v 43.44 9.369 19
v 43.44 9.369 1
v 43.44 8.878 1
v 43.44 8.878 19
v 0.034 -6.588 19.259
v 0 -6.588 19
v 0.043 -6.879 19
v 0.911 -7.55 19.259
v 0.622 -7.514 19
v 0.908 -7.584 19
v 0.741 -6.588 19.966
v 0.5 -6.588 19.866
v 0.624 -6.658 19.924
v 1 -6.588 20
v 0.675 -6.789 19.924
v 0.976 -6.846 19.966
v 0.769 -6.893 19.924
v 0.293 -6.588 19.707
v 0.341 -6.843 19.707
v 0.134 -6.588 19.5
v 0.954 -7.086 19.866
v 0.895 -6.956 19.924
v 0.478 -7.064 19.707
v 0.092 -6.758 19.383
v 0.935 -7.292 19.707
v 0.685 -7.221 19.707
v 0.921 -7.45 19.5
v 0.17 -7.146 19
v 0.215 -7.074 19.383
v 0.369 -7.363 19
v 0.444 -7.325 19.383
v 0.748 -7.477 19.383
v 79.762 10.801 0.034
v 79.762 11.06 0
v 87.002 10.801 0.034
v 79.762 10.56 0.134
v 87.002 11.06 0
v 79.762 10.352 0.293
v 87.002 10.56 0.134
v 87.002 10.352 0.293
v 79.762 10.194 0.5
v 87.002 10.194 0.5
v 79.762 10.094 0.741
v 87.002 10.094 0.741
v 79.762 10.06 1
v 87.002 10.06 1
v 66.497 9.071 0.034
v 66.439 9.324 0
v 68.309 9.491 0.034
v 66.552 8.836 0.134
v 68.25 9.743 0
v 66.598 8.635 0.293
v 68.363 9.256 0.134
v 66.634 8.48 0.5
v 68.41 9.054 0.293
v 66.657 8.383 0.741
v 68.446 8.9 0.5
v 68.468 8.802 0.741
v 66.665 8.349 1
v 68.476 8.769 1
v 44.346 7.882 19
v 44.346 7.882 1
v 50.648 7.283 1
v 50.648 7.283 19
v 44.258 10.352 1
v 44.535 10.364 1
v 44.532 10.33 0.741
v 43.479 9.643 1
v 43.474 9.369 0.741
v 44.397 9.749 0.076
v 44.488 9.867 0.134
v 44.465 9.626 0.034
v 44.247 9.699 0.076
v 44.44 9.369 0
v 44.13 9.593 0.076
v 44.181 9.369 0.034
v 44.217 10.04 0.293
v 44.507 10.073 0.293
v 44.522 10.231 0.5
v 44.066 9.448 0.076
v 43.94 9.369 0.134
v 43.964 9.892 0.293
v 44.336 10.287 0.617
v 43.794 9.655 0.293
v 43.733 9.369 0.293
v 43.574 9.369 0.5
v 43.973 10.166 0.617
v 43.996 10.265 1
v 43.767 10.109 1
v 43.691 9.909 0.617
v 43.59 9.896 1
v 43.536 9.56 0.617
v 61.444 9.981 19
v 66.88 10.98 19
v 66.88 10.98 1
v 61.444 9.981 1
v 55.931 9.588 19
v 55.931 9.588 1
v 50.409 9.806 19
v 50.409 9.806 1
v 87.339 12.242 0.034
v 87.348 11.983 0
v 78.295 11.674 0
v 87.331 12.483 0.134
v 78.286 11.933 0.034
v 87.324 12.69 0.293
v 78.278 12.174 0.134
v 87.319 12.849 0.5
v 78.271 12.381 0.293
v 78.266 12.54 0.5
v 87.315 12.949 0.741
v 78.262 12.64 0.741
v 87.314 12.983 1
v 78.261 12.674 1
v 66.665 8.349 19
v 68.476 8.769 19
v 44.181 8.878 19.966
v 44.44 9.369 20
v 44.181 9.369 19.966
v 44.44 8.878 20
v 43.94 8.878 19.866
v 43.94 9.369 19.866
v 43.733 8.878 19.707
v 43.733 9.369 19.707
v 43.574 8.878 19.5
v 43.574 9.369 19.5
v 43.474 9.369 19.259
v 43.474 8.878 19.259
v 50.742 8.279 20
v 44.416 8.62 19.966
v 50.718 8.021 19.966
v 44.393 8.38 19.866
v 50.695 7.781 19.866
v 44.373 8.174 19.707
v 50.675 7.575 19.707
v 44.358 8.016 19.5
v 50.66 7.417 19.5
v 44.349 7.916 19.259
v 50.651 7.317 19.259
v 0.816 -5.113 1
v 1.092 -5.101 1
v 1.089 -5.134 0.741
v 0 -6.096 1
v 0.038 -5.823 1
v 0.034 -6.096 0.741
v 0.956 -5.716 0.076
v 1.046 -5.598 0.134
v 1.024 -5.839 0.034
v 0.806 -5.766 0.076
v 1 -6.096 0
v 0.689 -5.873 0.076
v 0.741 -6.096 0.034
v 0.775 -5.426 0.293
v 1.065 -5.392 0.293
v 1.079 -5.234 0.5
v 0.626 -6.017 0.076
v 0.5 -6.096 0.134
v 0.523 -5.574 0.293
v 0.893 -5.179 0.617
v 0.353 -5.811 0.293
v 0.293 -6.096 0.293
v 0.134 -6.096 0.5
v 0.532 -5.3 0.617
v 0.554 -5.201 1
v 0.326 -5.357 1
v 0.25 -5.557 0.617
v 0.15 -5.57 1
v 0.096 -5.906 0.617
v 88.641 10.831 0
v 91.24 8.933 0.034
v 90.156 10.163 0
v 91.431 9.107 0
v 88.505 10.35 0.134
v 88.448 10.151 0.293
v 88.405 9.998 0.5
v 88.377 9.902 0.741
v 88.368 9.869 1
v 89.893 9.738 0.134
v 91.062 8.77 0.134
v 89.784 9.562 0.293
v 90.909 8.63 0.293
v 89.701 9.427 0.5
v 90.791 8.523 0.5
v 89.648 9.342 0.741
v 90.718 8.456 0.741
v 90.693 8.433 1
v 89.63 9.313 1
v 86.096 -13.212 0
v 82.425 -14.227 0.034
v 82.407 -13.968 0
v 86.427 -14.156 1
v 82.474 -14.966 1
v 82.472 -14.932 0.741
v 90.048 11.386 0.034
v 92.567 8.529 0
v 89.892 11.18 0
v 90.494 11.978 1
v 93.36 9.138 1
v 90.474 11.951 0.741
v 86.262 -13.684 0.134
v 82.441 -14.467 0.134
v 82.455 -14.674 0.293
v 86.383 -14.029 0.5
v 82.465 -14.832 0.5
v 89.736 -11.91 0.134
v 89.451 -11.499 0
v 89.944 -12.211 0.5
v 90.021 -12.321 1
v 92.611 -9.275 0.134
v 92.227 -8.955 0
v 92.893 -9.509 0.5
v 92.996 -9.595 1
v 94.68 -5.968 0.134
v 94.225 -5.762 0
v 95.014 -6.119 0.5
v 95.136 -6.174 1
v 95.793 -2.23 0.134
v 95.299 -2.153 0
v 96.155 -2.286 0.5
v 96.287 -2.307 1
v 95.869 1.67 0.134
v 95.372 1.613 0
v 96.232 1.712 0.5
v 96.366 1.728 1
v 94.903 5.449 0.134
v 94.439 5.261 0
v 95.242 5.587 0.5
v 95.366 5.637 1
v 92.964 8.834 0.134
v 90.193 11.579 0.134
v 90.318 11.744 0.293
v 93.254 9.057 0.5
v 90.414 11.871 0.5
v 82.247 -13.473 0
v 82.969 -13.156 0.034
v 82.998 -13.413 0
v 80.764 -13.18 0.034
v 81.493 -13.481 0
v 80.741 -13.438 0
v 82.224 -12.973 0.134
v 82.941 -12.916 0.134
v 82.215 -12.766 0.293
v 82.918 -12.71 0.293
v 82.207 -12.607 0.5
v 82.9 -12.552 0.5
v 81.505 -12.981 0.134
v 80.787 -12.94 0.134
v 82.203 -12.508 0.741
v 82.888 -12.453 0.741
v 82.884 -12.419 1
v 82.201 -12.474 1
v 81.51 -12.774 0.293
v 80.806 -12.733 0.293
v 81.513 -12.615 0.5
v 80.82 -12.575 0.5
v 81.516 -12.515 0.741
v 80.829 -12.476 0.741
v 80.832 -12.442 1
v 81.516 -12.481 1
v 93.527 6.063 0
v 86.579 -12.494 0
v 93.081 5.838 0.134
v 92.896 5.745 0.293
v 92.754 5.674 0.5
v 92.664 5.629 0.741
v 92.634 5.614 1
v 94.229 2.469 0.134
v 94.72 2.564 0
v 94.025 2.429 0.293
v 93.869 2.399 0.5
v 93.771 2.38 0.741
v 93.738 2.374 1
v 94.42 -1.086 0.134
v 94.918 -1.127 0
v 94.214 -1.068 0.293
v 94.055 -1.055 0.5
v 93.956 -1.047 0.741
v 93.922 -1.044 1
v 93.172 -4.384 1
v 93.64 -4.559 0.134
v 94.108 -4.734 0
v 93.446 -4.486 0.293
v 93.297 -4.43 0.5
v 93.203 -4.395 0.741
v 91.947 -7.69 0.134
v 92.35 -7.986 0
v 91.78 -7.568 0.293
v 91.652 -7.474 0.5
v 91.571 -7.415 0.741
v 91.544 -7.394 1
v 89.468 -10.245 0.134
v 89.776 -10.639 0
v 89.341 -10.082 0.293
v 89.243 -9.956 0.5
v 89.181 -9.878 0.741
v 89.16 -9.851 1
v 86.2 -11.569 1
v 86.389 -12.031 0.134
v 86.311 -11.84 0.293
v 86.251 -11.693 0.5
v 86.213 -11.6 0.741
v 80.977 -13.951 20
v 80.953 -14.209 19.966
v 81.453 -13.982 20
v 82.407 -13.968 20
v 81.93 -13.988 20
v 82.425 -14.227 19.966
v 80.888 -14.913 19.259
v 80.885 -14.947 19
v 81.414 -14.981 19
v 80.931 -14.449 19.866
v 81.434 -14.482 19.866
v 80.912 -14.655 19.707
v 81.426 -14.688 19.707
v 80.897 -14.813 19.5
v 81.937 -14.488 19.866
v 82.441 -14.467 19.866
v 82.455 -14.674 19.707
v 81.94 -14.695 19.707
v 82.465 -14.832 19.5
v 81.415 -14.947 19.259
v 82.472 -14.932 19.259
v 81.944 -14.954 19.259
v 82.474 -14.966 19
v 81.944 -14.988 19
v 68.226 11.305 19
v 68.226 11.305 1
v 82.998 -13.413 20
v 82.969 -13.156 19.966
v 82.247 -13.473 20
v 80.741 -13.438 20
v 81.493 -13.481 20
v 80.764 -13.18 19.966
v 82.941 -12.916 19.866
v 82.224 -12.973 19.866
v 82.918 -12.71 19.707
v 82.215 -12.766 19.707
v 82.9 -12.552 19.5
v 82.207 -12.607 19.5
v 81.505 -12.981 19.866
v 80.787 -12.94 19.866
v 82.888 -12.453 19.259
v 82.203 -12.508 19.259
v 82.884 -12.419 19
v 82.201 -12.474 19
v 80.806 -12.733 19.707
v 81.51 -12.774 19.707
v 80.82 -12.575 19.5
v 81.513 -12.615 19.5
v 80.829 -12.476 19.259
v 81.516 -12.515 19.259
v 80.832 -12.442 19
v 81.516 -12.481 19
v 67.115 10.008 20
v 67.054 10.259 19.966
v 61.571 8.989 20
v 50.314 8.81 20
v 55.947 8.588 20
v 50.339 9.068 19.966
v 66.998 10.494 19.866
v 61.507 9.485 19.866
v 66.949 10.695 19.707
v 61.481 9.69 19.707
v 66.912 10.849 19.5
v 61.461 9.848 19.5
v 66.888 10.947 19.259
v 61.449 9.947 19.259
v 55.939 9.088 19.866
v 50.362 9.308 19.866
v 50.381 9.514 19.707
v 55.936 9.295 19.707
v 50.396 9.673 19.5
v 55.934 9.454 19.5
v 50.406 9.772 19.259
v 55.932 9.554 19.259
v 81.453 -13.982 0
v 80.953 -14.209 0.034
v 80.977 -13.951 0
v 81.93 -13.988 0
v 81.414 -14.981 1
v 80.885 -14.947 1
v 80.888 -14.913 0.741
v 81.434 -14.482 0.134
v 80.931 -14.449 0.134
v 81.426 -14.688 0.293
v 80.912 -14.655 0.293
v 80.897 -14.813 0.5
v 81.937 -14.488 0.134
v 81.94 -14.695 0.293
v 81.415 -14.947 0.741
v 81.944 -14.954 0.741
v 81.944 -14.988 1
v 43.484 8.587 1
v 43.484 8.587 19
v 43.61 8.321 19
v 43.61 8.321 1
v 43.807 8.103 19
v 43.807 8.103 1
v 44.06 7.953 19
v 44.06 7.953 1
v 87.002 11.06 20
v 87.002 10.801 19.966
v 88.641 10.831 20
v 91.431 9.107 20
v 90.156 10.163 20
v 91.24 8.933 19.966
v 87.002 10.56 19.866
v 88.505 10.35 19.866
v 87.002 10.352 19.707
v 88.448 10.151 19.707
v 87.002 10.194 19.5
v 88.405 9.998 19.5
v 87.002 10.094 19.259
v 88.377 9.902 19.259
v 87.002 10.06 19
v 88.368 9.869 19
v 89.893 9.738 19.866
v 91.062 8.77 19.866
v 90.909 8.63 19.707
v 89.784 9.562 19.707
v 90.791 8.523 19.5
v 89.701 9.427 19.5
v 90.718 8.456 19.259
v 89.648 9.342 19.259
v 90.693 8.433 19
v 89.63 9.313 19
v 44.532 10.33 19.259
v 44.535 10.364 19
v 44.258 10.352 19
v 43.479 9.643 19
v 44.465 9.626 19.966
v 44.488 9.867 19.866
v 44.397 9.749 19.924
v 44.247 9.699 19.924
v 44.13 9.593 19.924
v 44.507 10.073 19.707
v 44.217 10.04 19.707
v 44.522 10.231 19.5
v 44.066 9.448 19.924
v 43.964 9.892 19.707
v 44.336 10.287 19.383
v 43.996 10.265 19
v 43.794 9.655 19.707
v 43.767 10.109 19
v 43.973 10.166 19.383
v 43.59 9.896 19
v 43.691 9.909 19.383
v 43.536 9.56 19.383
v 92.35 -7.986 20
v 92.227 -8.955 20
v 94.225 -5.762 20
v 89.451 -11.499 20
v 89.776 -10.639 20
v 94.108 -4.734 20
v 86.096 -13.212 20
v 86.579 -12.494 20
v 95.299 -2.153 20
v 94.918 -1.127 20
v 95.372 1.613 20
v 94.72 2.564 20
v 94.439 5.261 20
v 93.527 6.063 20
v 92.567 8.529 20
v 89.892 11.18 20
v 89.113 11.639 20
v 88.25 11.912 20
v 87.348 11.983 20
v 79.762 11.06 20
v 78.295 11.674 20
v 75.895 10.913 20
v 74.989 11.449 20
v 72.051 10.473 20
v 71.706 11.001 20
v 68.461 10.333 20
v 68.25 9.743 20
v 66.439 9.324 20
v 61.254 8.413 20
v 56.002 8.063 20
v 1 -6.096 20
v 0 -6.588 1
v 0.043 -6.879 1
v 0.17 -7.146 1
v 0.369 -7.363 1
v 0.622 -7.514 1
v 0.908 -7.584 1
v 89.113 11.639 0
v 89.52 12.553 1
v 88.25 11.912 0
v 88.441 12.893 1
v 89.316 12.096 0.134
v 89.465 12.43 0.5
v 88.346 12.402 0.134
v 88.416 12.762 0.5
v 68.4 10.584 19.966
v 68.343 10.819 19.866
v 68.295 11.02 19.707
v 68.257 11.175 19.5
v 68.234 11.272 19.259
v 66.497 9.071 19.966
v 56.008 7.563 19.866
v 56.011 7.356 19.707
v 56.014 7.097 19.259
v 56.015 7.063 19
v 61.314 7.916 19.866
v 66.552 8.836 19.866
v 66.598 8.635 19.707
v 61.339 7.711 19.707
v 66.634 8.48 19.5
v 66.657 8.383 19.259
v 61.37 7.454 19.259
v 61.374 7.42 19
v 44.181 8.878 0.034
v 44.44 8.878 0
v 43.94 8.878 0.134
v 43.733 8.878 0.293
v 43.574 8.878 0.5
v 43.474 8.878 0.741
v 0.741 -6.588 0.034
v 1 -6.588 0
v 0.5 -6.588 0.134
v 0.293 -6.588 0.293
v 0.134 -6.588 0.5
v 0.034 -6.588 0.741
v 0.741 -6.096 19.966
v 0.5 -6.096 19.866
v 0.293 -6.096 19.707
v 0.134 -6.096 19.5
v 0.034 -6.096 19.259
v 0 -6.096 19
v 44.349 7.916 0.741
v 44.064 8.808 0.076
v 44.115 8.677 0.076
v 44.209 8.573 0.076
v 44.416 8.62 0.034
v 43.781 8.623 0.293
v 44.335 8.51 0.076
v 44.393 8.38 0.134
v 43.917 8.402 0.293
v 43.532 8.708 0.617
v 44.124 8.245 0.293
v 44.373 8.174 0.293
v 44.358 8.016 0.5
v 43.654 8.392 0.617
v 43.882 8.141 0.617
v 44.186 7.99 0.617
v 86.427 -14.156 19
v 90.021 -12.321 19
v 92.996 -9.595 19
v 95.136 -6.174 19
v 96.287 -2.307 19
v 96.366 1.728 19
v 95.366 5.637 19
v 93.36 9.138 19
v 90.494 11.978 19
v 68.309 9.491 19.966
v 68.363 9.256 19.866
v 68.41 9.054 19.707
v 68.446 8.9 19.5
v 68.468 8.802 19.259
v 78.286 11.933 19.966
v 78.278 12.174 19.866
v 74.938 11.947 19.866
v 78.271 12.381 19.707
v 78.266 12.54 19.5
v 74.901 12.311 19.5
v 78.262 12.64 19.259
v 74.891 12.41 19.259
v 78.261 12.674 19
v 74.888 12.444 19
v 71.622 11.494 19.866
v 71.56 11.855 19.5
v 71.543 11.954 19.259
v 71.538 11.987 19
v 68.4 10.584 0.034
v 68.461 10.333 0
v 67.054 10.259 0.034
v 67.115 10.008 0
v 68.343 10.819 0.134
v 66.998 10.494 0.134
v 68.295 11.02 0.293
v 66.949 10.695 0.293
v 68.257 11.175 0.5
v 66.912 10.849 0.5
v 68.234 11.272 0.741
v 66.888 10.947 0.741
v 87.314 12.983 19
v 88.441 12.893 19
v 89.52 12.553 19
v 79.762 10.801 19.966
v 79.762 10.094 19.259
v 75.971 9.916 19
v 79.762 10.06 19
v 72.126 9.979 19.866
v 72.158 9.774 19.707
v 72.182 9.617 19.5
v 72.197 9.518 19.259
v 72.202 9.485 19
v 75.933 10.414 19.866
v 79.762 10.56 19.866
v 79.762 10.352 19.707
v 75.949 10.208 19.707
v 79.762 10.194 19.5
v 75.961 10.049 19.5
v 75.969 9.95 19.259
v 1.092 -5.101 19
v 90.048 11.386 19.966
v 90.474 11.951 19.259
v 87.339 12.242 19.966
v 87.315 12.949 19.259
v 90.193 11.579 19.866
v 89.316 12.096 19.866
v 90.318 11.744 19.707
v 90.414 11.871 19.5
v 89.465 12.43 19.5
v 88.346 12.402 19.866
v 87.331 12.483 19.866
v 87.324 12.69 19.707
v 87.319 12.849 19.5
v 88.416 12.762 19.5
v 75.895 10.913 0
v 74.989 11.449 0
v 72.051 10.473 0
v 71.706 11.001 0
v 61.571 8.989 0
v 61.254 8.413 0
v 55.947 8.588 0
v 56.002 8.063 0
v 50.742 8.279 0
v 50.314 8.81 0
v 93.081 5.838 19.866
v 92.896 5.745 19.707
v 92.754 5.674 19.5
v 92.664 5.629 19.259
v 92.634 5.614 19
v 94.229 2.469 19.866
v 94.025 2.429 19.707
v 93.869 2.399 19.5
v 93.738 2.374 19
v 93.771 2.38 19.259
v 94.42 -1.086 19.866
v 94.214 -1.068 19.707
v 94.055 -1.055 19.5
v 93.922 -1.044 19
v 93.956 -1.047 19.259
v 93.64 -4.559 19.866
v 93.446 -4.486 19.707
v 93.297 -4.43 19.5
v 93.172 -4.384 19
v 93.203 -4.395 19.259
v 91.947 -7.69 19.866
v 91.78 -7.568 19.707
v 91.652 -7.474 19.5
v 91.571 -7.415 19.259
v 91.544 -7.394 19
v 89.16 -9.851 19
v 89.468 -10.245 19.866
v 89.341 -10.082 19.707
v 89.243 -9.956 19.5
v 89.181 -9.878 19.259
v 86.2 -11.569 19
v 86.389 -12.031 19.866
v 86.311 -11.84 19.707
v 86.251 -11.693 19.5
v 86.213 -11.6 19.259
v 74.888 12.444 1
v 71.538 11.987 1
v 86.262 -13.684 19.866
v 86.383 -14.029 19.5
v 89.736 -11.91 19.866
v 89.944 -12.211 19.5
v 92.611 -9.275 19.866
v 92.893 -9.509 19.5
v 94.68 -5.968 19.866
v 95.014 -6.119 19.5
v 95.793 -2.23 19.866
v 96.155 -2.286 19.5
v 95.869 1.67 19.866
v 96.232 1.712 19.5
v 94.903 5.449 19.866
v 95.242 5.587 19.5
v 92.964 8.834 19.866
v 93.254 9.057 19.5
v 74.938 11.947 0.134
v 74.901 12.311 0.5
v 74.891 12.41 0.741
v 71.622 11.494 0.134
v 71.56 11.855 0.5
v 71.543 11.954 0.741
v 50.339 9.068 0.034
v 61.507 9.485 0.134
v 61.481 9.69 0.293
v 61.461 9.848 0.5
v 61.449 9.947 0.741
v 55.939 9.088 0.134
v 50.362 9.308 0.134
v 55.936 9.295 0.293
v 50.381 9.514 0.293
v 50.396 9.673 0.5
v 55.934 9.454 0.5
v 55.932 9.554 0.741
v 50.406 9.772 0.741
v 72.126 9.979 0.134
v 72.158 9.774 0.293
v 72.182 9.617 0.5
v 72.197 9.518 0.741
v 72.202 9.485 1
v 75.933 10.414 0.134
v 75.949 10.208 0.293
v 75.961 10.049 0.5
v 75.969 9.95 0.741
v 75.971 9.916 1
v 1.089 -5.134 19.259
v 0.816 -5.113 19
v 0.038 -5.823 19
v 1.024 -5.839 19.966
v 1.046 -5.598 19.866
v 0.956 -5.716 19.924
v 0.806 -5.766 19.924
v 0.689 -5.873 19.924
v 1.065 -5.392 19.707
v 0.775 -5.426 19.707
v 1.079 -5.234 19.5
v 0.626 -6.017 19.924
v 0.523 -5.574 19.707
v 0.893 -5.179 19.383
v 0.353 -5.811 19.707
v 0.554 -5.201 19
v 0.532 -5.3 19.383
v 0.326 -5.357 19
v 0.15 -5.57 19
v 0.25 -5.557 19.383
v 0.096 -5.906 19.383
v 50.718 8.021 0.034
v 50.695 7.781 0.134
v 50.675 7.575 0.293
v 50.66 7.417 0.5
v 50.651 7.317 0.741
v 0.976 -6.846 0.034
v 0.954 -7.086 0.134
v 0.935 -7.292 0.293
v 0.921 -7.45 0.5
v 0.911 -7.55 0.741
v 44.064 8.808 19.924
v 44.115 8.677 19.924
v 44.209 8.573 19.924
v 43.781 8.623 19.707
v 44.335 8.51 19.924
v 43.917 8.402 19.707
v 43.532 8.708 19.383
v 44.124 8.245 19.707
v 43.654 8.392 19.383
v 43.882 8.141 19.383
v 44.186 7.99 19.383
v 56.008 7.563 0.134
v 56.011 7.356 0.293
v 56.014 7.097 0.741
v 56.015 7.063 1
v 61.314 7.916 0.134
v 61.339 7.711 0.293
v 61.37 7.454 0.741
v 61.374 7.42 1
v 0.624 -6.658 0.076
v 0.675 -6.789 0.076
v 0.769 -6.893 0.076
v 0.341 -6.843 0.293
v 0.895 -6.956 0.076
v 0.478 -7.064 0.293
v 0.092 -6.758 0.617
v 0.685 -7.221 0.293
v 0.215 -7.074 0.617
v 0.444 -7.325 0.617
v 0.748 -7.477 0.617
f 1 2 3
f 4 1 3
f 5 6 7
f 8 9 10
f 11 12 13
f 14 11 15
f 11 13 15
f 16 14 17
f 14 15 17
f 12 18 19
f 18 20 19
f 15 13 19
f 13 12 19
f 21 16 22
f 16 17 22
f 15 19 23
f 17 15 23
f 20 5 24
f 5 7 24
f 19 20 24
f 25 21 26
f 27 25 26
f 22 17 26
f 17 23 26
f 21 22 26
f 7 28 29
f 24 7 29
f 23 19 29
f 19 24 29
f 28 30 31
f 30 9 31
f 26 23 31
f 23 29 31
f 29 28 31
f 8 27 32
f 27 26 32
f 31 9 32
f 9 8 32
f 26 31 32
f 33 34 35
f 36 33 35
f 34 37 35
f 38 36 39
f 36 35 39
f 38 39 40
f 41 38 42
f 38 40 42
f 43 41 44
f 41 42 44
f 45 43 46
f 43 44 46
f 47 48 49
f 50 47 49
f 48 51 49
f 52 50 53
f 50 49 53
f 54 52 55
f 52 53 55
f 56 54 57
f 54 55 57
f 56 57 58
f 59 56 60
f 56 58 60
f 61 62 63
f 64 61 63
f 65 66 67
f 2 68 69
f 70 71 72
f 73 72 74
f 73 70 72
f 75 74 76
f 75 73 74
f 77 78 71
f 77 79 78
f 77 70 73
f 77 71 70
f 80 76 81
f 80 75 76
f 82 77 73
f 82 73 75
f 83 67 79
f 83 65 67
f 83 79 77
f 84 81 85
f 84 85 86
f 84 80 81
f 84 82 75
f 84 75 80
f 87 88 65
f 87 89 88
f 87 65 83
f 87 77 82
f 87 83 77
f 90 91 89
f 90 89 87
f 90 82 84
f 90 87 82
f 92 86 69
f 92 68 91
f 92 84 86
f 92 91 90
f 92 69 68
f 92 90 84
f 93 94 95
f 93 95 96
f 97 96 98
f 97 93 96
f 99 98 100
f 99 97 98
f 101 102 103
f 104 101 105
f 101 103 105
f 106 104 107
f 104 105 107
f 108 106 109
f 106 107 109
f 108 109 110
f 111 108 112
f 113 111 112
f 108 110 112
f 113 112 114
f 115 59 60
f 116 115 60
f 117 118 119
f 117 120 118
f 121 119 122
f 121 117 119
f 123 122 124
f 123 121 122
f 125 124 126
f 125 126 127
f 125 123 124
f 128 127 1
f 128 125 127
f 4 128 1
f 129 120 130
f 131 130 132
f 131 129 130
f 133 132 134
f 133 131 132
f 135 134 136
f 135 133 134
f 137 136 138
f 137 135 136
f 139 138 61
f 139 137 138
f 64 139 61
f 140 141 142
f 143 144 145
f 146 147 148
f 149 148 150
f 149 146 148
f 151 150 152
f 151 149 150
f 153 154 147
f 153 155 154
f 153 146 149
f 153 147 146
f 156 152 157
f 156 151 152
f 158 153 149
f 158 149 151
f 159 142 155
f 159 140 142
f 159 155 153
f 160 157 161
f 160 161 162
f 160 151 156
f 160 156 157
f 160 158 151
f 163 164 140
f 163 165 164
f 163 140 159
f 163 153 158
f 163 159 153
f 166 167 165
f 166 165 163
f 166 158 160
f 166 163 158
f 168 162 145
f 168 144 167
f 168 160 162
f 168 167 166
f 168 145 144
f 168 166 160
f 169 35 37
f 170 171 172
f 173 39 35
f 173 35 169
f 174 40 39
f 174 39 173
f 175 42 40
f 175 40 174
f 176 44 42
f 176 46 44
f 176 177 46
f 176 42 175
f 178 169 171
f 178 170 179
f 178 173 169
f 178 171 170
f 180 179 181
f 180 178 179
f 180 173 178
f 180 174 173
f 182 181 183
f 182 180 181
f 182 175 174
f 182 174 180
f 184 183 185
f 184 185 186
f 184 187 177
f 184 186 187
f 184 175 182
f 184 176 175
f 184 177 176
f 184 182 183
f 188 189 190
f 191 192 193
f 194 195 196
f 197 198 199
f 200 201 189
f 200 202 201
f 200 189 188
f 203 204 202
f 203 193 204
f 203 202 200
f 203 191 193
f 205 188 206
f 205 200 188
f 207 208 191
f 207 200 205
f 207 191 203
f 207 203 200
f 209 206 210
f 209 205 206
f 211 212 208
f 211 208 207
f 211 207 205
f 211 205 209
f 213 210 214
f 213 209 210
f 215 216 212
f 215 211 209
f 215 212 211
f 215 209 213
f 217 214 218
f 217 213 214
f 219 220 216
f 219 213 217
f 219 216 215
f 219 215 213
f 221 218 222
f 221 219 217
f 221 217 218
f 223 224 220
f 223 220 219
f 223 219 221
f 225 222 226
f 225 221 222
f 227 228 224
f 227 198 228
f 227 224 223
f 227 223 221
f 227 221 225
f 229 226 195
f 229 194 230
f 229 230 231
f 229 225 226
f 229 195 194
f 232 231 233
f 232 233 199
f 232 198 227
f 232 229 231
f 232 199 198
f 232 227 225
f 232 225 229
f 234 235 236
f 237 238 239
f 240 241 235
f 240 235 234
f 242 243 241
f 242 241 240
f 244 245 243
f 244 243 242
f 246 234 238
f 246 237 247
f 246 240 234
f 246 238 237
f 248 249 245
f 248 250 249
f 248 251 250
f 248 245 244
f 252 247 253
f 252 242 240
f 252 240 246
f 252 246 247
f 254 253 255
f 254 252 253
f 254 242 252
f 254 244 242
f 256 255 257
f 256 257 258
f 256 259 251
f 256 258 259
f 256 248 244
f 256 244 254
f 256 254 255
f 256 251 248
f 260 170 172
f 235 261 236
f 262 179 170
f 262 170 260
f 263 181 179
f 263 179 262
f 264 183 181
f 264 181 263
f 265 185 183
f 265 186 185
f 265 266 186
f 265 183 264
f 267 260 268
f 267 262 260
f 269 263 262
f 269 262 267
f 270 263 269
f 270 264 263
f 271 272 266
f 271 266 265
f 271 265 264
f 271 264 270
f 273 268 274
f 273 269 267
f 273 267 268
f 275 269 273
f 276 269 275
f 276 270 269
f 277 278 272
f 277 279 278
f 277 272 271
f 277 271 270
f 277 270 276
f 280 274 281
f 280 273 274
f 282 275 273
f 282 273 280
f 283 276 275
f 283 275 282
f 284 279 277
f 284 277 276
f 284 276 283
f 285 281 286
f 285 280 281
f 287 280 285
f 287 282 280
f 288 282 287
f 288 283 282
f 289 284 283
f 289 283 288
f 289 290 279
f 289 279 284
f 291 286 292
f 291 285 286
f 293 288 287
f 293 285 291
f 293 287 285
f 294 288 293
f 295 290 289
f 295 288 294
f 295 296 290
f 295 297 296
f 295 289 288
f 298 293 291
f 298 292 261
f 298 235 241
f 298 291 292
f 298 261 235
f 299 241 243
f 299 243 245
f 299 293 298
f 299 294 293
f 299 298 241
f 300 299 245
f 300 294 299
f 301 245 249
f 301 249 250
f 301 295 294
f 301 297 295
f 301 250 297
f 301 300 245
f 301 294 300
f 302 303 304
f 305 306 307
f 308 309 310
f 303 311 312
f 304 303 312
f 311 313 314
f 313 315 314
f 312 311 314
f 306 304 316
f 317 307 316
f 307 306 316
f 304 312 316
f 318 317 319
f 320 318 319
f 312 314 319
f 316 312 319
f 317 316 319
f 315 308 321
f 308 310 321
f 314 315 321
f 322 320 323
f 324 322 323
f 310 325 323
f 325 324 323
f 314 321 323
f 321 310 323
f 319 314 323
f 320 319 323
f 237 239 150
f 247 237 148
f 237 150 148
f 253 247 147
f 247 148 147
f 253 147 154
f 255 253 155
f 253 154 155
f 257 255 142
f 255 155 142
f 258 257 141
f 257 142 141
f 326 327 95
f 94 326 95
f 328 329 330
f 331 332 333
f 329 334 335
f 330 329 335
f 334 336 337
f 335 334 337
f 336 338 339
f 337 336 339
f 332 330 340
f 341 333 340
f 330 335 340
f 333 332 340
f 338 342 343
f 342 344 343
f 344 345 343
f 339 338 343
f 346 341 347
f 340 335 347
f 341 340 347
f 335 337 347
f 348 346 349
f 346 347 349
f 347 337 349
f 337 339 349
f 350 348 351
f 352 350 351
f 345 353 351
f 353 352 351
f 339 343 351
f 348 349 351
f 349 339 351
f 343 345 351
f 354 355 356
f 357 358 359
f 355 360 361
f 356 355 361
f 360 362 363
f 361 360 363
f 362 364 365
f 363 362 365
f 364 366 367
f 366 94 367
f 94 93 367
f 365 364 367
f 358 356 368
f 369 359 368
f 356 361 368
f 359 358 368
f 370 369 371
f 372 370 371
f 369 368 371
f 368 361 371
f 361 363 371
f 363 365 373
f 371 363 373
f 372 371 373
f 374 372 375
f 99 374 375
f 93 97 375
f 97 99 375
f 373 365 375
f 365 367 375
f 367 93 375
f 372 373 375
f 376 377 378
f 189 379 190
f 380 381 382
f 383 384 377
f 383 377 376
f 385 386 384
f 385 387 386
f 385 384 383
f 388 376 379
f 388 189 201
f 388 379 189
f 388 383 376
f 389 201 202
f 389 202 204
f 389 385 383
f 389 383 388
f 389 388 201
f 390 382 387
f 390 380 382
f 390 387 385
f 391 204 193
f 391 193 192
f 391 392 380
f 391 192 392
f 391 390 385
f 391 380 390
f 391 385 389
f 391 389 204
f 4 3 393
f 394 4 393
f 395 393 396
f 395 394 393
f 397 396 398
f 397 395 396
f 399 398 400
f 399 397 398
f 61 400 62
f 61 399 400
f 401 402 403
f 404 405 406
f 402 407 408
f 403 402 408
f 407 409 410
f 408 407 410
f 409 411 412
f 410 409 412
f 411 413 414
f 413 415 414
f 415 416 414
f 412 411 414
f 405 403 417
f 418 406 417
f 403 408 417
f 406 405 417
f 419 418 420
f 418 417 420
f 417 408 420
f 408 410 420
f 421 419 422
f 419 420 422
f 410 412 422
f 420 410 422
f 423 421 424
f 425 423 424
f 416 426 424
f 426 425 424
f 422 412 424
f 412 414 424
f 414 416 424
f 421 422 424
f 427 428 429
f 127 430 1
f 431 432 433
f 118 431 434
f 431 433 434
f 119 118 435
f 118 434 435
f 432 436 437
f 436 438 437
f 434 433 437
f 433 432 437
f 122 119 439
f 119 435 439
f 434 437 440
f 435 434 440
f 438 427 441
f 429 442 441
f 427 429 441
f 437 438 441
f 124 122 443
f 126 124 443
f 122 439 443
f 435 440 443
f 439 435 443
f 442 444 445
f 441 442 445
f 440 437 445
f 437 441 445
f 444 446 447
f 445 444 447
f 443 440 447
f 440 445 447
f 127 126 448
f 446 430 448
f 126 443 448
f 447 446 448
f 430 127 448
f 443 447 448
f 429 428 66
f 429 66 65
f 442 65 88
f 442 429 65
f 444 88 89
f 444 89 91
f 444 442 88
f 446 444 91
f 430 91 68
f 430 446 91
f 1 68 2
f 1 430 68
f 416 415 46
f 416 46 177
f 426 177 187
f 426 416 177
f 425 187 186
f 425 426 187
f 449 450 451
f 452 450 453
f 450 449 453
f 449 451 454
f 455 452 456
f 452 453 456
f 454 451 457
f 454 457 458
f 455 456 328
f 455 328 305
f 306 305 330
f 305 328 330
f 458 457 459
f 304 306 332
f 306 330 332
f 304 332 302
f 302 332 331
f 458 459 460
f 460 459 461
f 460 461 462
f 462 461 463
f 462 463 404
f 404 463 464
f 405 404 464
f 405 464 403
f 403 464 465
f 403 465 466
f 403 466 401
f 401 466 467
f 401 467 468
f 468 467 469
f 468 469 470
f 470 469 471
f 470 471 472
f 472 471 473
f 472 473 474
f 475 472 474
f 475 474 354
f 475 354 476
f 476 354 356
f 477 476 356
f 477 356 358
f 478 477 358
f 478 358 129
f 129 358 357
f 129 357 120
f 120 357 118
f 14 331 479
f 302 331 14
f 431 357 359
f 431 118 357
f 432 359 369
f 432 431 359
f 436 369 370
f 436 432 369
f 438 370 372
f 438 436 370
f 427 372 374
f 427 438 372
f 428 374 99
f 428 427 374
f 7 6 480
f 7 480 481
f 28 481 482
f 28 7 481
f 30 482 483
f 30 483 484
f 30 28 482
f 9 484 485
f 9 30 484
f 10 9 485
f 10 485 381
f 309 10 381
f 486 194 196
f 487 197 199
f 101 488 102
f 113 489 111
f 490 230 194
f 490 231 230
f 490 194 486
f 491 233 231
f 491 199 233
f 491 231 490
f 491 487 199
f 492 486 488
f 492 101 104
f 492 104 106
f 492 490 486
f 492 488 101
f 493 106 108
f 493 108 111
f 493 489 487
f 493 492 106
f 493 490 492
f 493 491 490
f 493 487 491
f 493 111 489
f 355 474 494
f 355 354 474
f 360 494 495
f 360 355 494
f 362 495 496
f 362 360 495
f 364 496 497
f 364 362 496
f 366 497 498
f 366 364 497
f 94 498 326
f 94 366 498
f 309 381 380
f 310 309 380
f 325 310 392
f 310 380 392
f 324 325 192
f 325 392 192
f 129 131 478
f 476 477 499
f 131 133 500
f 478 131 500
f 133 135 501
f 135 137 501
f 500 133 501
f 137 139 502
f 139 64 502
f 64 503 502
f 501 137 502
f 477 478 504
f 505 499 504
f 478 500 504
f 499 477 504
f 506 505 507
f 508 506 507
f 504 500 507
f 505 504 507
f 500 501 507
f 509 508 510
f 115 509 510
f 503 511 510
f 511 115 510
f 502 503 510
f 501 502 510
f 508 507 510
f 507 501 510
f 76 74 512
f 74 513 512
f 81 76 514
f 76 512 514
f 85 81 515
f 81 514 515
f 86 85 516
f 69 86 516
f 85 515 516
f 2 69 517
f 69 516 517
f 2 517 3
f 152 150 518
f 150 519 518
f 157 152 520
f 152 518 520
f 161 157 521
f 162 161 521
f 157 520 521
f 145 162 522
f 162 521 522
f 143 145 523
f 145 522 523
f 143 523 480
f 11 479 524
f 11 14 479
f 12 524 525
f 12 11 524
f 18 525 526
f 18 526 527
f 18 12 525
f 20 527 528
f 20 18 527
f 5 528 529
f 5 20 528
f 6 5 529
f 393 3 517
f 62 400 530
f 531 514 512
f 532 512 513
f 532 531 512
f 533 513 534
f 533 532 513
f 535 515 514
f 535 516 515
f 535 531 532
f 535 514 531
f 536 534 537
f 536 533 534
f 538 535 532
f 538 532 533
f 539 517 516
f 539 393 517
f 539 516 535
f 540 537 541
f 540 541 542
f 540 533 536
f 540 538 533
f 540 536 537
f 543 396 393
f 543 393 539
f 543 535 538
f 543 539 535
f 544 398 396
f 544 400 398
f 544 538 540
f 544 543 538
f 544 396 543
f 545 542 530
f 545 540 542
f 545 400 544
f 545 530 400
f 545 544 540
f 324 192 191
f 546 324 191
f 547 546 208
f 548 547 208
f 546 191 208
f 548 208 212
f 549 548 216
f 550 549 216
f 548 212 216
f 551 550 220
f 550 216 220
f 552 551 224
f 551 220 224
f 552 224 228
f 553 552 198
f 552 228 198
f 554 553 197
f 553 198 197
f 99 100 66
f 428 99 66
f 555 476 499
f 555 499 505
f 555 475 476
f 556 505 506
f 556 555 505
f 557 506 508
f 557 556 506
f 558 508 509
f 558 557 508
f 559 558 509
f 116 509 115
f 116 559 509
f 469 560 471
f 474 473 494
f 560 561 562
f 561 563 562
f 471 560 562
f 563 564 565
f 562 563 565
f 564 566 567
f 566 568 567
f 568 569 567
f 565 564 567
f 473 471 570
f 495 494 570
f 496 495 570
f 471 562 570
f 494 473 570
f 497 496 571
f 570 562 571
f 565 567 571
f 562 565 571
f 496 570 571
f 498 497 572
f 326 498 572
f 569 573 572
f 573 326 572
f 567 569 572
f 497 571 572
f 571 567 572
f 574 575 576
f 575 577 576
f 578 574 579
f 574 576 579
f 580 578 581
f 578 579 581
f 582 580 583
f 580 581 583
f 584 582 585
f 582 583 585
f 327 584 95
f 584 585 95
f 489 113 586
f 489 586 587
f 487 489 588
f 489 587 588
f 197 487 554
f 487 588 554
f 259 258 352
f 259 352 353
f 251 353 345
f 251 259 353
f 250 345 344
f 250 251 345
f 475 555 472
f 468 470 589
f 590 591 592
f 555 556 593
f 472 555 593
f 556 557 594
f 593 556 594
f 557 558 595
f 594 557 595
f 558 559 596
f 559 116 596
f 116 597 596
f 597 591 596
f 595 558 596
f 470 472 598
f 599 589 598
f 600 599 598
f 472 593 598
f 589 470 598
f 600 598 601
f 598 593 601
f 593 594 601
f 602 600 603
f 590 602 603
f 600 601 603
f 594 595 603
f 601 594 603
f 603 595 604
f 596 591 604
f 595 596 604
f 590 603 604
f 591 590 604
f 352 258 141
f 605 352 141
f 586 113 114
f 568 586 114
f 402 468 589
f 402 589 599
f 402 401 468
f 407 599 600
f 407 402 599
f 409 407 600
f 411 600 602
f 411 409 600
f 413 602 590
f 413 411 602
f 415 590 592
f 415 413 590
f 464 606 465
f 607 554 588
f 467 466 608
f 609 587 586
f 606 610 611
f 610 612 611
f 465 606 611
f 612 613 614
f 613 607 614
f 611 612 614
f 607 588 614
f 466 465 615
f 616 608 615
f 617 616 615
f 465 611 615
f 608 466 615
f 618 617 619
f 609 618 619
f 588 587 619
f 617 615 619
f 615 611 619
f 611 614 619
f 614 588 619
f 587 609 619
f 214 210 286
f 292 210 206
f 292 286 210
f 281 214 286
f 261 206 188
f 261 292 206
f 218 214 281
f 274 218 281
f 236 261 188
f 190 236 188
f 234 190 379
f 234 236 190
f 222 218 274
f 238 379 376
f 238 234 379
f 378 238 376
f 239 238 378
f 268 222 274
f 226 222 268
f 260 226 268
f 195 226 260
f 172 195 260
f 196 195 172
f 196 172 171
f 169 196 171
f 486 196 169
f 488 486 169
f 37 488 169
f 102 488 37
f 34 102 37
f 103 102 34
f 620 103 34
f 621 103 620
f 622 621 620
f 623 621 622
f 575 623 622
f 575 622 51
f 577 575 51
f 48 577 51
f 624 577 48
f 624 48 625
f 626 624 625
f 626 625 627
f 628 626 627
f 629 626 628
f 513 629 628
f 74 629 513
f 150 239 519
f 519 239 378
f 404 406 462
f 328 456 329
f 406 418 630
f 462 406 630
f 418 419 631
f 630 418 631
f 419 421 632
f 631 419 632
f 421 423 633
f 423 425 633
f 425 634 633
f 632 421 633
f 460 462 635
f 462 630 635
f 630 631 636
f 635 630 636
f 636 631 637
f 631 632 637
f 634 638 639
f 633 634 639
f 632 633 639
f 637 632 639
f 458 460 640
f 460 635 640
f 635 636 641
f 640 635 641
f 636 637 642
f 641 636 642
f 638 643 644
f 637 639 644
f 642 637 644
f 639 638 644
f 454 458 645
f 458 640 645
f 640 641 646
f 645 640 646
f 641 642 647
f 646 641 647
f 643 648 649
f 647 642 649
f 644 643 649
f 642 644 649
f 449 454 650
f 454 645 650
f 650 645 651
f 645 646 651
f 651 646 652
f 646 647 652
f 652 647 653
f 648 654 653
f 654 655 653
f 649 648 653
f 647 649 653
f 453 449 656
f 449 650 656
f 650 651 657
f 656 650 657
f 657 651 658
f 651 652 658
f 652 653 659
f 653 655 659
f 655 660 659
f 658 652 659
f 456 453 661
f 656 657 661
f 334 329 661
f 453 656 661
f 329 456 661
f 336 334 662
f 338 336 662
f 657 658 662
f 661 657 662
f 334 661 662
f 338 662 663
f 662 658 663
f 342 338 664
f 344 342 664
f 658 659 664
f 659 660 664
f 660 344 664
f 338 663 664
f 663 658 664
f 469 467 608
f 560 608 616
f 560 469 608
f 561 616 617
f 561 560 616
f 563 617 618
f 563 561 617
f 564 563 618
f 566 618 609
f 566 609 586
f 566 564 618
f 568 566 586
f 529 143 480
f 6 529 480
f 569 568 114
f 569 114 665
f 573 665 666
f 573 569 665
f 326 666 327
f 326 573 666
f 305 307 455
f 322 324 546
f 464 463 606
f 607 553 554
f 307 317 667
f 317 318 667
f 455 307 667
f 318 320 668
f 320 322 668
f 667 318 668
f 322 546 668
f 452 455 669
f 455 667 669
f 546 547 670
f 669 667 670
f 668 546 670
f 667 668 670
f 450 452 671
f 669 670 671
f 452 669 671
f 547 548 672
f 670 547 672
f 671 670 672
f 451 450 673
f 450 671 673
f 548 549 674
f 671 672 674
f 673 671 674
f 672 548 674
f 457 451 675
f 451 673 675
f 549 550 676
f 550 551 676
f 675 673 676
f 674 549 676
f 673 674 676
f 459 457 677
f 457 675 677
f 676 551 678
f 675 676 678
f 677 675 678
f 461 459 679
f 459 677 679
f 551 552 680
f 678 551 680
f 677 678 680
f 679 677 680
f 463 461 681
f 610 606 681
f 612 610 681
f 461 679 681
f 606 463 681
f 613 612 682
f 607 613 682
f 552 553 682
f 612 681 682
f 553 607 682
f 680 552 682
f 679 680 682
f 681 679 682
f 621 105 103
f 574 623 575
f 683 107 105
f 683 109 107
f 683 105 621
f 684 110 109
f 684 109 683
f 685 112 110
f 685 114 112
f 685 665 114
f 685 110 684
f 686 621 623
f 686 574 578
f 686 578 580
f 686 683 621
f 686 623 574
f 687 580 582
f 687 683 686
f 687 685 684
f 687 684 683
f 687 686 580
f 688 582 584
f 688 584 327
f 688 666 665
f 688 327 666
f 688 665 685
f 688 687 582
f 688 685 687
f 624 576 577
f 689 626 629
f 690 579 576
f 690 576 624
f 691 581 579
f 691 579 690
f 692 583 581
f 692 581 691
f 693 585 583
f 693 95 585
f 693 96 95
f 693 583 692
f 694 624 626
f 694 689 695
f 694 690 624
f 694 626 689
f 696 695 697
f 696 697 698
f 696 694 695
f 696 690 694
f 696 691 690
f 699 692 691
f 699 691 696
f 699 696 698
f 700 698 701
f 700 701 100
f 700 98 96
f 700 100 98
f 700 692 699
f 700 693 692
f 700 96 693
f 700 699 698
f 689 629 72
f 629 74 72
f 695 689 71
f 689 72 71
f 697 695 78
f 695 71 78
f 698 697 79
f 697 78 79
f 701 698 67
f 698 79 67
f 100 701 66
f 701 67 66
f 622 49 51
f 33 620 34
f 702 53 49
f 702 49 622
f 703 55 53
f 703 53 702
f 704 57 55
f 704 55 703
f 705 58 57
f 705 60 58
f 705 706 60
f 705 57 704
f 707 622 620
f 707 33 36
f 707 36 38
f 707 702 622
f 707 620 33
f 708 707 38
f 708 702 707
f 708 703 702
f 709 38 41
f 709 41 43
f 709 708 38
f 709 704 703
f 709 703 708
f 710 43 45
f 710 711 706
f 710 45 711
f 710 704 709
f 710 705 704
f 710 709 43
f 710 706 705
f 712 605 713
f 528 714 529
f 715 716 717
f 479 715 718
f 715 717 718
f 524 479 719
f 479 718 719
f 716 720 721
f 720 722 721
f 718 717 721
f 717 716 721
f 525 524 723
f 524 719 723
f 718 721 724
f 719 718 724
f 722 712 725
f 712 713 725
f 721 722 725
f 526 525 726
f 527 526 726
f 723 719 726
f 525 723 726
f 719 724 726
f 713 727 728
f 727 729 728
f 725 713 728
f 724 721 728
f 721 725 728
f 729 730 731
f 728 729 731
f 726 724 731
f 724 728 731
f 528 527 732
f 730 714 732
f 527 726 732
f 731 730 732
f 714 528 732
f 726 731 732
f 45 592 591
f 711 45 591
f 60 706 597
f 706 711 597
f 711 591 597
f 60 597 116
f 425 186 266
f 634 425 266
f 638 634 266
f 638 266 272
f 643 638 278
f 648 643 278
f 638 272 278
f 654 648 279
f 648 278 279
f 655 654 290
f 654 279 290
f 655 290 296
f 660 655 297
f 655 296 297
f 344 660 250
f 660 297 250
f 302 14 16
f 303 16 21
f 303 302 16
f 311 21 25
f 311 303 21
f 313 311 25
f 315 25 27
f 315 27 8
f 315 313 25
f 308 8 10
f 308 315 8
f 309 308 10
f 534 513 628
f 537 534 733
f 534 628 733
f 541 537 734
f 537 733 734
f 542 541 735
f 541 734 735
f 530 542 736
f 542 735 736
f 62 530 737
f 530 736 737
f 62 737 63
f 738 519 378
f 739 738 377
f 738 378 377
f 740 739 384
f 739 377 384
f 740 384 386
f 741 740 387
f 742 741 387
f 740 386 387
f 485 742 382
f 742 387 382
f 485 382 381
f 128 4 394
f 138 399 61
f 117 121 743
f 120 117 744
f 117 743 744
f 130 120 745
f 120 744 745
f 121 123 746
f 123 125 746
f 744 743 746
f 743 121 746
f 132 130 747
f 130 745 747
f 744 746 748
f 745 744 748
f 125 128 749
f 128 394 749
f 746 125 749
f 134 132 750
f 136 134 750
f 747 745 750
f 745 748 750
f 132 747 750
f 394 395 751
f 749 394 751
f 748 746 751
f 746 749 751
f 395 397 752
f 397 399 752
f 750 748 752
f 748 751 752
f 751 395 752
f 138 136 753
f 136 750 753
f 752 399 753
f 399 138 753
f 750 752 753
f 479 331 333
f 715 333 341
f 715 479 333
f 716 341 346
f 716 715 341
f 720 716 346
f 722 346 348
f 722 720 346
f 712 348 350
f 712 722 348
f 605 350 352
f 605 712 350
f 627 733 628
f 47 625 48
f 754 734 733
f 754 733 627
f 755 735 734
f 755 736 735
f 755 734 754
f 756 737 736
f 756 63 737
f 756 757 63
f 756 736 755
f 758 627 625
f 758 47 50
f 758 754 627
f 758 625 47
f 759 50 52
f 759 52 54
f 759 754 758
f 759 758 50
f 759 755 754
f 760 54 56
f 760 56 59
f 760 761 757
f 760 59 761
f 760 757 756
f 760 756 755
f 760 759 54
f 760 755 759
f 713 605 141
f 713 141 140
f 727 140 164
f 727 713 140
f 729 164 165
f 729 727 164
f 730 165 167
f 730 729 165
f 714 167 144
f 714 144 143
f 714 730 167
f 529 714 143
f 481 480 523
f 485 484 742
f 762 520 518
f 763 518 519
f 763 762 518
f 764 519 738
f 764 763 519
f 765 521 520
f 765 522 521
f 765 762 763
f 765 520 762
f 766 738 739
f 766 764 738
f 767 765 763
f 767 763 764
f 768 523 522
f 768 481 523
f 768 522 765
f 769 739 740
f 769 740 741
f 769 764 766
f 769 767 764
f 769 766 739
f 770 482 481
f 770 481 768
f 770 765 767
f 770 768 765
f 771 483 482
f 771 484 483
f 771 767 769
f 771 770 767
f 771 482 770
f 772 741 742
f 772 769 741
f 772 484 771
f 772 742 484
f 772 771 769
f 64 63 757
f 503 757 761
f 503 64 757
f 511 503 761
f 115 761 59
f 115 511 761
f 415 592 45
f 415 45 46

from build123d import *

# Parameters (mm, degrees)
BOSS_EXTRUDE1_DEPTH = 20
FILLET1_R           = 50
FILLET2_R           = 50
FILLET3_R           = 5
FILLET4_R           = 10
FILLET5_R           = 1
FILLET6_R           = 1


with BuildPart() as part:
    # Sketch1 → Boss-Extrude1 (new body)
    with BuildSketch(Plane.XY):
        with BuildLine():
            Line((1.53e-15, -7.5), (81.46535975563725, -15))
            ThreePointArc((81.46535975563725, -15), (95.96612319887386, -3.8376893521092743), (88.88528315077919, 13.036285391560943))
            Line((88.88528315077919, 13.036285391560943), (73.17379777974874, 12.49999999999999))
            Line((73.17379777974874, 12.49999999999999), (58.74284079566012, 9.013925925539251))
            Line((58.74284079566012, 9.013925925539251), (43.44024523082493, 10.4682923771142))
            Line((43.44024523082493, 10.4682923771142), (43.44024523082493, 7.968292377114199))
            Line((43.44024523082493, 7.968292377114199), (58.74284079566012, 6.51392592553925))
            Line((58.74284079566012, 6.51392592553925), (74.04543636049529, 10.059559473964299))
            Line((74.04543636049529, 10.059559473964299), (88.88528315077919, 10.059559473964299))
            ThreePointArc((88.88528315077919, 10.059559473964299), (93.33958590778194, -3.9054773444129744), (81.46535975563725, -12.49999999999999))
            Line((81.46535975563725, -12.49999999999999), (-7.7e-16, -5))
            Line((-7.7e-16, -5), (1.53e-15, -7.5))
        make_face()
    extrude(amount=BOSS_EXTRUDE1_DEPTH)

    # Fillet1
    fillet1_edges = [part.edges().sort_by_distance(p)[0] for p in [
        (58.74284079566012, 9.013925925539251, 10),
        (73.17379777974874, 12.49999999999999, 10),
    ]]
    fillet(fillet1_edges, radius=FILLET1_R)

    # Fillet2
    fillet2_edges = [part.edges().sort_by_distance(p)[0] for p in [
        (74.04543636049529, 10.059559473964299, 10),
        (58.74284079566012, 6.51392592553925, 10),
    ]]
    fillet(fillet2_edges, radius=FILLET2_R)

    # Fillet3
    fillet3_edges = [part.edges().sort_by_distance(p)[0] for p in [
        (88.88528315077919, 10.059559473964299, 10),
        (88.88528315077919, 13.036285391560945, 10),
    ]]
    fillet(fillet3_edges, radius=FILLET3_R)

    # Fillet4
    # the kernel refuses this fillet: 10 mm, written as the material it adds along each edge
    with BuildSketch(Plane(origin=(81.46535975563725, -12.499999999999993, 0), x_dir=(0.9983825762287738, 0.05685271746184882, 0), z_dir=(0, 0, 1))) as fillet4_piece_1:
        with BuildLine():
            CenterArc((0.8527907619277444, 9.983825762287736), FILLET4_R, 261.4807895615496, 11.77838854979251)
            Line((-0.6286192920357523, 0.09416326794467102), (0, 0))
            ThreePointArc((0, 0), (0.7106589682731511, -0.02021779714032781), (1.4213179365462814, 1e-17))
        make_face()
    extrude(amount=20)
    # the kernel refuses this fillet: 10 mm, written as the material it takes off along each edge
    with BuildSketch(Plane(origin=(81.46535975563715, -14.999999999999993, -2.523941837712784), x_dir=(-0.9957888906378437, 0.09167597985433422, 0), z_dir=(0, 0, 1))) as fillet4_2_piece_1:
        with BuildLine():
            CenterArc((0.5828793997689569, -10), FILLET4_R, 90.00000000000003, 9.11705963897387)
            ThreePointArc((-1.0016411963229432, -0.12633328086467327), (-0.5018837587629004, -0.05473730613968529), (0, 0))
            Line((0, 0), (0.5828793997689534, 0))
        make_face()
    extrude(amount=25.047883675425567, mode=Mode.SUBTRACT)

    # Fillet5
    fillet5_edges = [part.edges().sort_by_distance(p)[0] for p in [
        (1.53e-15, -7.5, 10),
        (-7.7e-16, -5, 10),
        (43.44024523082493, 7.968292377114199, 10),
        (43.44024523082493, 10.4682923771142, 10),
    ]]
    fillet(fillet5_edges, radius=FILLET5_R)

    # Fillet6
    fillet6_edges = [part.edges().sort_by_distance(p)[0] for p in [
        (67.55312596624809, 11.142219063385667, 0),
        (67.55312596624809, 11.142219063385667, 20),
        (82.78750373367262, 12.828147844719894, 0),
        (73.2087271321753, 12.243940169804823, 0),
        (82.78750373367262, 12.828147844719894, 20),
        (73.2087271321753, 12.243940169804823, 20),
        (58.69337304228126, 9.708148200467306, 0),
        (58.69337304228126, 9.708148200467306, 20),
        (83.38196474552188, 10.059559473964299, 0),
        (83.38196474552188, 10.059559473964299, 20),
        (67.57035497563798, 8.559273742065987, 0),
        (67.57035497563798, 8.559273742065987, 20),
        (58.69921223462093, 7.16938370928515, 0),
        (58.69921223462093, 7.16938370928515, 20),
        (74.08244123035955, 9.73590992988975, 0),
        (74.08244123035955, 9.73590992988975, 20),
        (88.99028016615965, 12.753456202652604, 0),
        (88.99028016615965, 12.753456202652604, 20),
        (89.0184612808635, 9.634775220054735, 0),
        (89.0184612808635, 9.634775220054735, 20),
        (95.84204739674057, -4.27911818838268, 0),
        (95.84204739674057, -4.27911818838268, 20),
        (93.17154749853181, -4.383510981862012, 0),
        (81.6792624975188, -14.987925542926858, 0),
        (93.17154749853181, -4.383510981862012, 20),
        (81.6792624975188, -14.987925542926858, 20),
        (81.85897083662152, -12.483235942602048, 0),
        (81.85897083662152, -12.483235942602048, 20),
        (47.4966925492185, 7.582765564524983, 0),
        (47.4966925492185, 7.582765564524983, 20),
        (40.89662947245553, -11.265093801383376, 0),
        (4.7e-16, -6.342063670037142, 0),
        (40.96203987478691, -8.771115723080602, 0),
        (43.44024523082493, 9.123251869416467, 0),
        (47.471858609430626, 10.085125794770558, 0),
        (0.326084567565907, -5.3574840944297595, 0),
        (0.261191506595139, -7.2617501846737555, 0),
        (43.767420646607164, 10.108547727110885, 0),
        (43.70044317698066, 8.204933481348554, 0),
        (43.44024523082493, 9.123251869416467, 20),
        (40.89662947245553, -11.265093801383376, 20),
        (47.471858609430626, 10.085125794770558, 20),
        (40.96203987478691, -8.771115723080602, 20),
        (4.7e-16, -6.342063670037142, 20),
        (0.326084567565907, -5.3574840944297595, 20),
        (0.261191506595139, -7.2617501846737555, 20),
        (43.767420646607164, 10.108547727110885, 20),
        (43.70044317698066, 8.204933481348554, 20),
    ]]
    fillet(fillet6_edges, radius=FILLET6_R)


solid = part.part
